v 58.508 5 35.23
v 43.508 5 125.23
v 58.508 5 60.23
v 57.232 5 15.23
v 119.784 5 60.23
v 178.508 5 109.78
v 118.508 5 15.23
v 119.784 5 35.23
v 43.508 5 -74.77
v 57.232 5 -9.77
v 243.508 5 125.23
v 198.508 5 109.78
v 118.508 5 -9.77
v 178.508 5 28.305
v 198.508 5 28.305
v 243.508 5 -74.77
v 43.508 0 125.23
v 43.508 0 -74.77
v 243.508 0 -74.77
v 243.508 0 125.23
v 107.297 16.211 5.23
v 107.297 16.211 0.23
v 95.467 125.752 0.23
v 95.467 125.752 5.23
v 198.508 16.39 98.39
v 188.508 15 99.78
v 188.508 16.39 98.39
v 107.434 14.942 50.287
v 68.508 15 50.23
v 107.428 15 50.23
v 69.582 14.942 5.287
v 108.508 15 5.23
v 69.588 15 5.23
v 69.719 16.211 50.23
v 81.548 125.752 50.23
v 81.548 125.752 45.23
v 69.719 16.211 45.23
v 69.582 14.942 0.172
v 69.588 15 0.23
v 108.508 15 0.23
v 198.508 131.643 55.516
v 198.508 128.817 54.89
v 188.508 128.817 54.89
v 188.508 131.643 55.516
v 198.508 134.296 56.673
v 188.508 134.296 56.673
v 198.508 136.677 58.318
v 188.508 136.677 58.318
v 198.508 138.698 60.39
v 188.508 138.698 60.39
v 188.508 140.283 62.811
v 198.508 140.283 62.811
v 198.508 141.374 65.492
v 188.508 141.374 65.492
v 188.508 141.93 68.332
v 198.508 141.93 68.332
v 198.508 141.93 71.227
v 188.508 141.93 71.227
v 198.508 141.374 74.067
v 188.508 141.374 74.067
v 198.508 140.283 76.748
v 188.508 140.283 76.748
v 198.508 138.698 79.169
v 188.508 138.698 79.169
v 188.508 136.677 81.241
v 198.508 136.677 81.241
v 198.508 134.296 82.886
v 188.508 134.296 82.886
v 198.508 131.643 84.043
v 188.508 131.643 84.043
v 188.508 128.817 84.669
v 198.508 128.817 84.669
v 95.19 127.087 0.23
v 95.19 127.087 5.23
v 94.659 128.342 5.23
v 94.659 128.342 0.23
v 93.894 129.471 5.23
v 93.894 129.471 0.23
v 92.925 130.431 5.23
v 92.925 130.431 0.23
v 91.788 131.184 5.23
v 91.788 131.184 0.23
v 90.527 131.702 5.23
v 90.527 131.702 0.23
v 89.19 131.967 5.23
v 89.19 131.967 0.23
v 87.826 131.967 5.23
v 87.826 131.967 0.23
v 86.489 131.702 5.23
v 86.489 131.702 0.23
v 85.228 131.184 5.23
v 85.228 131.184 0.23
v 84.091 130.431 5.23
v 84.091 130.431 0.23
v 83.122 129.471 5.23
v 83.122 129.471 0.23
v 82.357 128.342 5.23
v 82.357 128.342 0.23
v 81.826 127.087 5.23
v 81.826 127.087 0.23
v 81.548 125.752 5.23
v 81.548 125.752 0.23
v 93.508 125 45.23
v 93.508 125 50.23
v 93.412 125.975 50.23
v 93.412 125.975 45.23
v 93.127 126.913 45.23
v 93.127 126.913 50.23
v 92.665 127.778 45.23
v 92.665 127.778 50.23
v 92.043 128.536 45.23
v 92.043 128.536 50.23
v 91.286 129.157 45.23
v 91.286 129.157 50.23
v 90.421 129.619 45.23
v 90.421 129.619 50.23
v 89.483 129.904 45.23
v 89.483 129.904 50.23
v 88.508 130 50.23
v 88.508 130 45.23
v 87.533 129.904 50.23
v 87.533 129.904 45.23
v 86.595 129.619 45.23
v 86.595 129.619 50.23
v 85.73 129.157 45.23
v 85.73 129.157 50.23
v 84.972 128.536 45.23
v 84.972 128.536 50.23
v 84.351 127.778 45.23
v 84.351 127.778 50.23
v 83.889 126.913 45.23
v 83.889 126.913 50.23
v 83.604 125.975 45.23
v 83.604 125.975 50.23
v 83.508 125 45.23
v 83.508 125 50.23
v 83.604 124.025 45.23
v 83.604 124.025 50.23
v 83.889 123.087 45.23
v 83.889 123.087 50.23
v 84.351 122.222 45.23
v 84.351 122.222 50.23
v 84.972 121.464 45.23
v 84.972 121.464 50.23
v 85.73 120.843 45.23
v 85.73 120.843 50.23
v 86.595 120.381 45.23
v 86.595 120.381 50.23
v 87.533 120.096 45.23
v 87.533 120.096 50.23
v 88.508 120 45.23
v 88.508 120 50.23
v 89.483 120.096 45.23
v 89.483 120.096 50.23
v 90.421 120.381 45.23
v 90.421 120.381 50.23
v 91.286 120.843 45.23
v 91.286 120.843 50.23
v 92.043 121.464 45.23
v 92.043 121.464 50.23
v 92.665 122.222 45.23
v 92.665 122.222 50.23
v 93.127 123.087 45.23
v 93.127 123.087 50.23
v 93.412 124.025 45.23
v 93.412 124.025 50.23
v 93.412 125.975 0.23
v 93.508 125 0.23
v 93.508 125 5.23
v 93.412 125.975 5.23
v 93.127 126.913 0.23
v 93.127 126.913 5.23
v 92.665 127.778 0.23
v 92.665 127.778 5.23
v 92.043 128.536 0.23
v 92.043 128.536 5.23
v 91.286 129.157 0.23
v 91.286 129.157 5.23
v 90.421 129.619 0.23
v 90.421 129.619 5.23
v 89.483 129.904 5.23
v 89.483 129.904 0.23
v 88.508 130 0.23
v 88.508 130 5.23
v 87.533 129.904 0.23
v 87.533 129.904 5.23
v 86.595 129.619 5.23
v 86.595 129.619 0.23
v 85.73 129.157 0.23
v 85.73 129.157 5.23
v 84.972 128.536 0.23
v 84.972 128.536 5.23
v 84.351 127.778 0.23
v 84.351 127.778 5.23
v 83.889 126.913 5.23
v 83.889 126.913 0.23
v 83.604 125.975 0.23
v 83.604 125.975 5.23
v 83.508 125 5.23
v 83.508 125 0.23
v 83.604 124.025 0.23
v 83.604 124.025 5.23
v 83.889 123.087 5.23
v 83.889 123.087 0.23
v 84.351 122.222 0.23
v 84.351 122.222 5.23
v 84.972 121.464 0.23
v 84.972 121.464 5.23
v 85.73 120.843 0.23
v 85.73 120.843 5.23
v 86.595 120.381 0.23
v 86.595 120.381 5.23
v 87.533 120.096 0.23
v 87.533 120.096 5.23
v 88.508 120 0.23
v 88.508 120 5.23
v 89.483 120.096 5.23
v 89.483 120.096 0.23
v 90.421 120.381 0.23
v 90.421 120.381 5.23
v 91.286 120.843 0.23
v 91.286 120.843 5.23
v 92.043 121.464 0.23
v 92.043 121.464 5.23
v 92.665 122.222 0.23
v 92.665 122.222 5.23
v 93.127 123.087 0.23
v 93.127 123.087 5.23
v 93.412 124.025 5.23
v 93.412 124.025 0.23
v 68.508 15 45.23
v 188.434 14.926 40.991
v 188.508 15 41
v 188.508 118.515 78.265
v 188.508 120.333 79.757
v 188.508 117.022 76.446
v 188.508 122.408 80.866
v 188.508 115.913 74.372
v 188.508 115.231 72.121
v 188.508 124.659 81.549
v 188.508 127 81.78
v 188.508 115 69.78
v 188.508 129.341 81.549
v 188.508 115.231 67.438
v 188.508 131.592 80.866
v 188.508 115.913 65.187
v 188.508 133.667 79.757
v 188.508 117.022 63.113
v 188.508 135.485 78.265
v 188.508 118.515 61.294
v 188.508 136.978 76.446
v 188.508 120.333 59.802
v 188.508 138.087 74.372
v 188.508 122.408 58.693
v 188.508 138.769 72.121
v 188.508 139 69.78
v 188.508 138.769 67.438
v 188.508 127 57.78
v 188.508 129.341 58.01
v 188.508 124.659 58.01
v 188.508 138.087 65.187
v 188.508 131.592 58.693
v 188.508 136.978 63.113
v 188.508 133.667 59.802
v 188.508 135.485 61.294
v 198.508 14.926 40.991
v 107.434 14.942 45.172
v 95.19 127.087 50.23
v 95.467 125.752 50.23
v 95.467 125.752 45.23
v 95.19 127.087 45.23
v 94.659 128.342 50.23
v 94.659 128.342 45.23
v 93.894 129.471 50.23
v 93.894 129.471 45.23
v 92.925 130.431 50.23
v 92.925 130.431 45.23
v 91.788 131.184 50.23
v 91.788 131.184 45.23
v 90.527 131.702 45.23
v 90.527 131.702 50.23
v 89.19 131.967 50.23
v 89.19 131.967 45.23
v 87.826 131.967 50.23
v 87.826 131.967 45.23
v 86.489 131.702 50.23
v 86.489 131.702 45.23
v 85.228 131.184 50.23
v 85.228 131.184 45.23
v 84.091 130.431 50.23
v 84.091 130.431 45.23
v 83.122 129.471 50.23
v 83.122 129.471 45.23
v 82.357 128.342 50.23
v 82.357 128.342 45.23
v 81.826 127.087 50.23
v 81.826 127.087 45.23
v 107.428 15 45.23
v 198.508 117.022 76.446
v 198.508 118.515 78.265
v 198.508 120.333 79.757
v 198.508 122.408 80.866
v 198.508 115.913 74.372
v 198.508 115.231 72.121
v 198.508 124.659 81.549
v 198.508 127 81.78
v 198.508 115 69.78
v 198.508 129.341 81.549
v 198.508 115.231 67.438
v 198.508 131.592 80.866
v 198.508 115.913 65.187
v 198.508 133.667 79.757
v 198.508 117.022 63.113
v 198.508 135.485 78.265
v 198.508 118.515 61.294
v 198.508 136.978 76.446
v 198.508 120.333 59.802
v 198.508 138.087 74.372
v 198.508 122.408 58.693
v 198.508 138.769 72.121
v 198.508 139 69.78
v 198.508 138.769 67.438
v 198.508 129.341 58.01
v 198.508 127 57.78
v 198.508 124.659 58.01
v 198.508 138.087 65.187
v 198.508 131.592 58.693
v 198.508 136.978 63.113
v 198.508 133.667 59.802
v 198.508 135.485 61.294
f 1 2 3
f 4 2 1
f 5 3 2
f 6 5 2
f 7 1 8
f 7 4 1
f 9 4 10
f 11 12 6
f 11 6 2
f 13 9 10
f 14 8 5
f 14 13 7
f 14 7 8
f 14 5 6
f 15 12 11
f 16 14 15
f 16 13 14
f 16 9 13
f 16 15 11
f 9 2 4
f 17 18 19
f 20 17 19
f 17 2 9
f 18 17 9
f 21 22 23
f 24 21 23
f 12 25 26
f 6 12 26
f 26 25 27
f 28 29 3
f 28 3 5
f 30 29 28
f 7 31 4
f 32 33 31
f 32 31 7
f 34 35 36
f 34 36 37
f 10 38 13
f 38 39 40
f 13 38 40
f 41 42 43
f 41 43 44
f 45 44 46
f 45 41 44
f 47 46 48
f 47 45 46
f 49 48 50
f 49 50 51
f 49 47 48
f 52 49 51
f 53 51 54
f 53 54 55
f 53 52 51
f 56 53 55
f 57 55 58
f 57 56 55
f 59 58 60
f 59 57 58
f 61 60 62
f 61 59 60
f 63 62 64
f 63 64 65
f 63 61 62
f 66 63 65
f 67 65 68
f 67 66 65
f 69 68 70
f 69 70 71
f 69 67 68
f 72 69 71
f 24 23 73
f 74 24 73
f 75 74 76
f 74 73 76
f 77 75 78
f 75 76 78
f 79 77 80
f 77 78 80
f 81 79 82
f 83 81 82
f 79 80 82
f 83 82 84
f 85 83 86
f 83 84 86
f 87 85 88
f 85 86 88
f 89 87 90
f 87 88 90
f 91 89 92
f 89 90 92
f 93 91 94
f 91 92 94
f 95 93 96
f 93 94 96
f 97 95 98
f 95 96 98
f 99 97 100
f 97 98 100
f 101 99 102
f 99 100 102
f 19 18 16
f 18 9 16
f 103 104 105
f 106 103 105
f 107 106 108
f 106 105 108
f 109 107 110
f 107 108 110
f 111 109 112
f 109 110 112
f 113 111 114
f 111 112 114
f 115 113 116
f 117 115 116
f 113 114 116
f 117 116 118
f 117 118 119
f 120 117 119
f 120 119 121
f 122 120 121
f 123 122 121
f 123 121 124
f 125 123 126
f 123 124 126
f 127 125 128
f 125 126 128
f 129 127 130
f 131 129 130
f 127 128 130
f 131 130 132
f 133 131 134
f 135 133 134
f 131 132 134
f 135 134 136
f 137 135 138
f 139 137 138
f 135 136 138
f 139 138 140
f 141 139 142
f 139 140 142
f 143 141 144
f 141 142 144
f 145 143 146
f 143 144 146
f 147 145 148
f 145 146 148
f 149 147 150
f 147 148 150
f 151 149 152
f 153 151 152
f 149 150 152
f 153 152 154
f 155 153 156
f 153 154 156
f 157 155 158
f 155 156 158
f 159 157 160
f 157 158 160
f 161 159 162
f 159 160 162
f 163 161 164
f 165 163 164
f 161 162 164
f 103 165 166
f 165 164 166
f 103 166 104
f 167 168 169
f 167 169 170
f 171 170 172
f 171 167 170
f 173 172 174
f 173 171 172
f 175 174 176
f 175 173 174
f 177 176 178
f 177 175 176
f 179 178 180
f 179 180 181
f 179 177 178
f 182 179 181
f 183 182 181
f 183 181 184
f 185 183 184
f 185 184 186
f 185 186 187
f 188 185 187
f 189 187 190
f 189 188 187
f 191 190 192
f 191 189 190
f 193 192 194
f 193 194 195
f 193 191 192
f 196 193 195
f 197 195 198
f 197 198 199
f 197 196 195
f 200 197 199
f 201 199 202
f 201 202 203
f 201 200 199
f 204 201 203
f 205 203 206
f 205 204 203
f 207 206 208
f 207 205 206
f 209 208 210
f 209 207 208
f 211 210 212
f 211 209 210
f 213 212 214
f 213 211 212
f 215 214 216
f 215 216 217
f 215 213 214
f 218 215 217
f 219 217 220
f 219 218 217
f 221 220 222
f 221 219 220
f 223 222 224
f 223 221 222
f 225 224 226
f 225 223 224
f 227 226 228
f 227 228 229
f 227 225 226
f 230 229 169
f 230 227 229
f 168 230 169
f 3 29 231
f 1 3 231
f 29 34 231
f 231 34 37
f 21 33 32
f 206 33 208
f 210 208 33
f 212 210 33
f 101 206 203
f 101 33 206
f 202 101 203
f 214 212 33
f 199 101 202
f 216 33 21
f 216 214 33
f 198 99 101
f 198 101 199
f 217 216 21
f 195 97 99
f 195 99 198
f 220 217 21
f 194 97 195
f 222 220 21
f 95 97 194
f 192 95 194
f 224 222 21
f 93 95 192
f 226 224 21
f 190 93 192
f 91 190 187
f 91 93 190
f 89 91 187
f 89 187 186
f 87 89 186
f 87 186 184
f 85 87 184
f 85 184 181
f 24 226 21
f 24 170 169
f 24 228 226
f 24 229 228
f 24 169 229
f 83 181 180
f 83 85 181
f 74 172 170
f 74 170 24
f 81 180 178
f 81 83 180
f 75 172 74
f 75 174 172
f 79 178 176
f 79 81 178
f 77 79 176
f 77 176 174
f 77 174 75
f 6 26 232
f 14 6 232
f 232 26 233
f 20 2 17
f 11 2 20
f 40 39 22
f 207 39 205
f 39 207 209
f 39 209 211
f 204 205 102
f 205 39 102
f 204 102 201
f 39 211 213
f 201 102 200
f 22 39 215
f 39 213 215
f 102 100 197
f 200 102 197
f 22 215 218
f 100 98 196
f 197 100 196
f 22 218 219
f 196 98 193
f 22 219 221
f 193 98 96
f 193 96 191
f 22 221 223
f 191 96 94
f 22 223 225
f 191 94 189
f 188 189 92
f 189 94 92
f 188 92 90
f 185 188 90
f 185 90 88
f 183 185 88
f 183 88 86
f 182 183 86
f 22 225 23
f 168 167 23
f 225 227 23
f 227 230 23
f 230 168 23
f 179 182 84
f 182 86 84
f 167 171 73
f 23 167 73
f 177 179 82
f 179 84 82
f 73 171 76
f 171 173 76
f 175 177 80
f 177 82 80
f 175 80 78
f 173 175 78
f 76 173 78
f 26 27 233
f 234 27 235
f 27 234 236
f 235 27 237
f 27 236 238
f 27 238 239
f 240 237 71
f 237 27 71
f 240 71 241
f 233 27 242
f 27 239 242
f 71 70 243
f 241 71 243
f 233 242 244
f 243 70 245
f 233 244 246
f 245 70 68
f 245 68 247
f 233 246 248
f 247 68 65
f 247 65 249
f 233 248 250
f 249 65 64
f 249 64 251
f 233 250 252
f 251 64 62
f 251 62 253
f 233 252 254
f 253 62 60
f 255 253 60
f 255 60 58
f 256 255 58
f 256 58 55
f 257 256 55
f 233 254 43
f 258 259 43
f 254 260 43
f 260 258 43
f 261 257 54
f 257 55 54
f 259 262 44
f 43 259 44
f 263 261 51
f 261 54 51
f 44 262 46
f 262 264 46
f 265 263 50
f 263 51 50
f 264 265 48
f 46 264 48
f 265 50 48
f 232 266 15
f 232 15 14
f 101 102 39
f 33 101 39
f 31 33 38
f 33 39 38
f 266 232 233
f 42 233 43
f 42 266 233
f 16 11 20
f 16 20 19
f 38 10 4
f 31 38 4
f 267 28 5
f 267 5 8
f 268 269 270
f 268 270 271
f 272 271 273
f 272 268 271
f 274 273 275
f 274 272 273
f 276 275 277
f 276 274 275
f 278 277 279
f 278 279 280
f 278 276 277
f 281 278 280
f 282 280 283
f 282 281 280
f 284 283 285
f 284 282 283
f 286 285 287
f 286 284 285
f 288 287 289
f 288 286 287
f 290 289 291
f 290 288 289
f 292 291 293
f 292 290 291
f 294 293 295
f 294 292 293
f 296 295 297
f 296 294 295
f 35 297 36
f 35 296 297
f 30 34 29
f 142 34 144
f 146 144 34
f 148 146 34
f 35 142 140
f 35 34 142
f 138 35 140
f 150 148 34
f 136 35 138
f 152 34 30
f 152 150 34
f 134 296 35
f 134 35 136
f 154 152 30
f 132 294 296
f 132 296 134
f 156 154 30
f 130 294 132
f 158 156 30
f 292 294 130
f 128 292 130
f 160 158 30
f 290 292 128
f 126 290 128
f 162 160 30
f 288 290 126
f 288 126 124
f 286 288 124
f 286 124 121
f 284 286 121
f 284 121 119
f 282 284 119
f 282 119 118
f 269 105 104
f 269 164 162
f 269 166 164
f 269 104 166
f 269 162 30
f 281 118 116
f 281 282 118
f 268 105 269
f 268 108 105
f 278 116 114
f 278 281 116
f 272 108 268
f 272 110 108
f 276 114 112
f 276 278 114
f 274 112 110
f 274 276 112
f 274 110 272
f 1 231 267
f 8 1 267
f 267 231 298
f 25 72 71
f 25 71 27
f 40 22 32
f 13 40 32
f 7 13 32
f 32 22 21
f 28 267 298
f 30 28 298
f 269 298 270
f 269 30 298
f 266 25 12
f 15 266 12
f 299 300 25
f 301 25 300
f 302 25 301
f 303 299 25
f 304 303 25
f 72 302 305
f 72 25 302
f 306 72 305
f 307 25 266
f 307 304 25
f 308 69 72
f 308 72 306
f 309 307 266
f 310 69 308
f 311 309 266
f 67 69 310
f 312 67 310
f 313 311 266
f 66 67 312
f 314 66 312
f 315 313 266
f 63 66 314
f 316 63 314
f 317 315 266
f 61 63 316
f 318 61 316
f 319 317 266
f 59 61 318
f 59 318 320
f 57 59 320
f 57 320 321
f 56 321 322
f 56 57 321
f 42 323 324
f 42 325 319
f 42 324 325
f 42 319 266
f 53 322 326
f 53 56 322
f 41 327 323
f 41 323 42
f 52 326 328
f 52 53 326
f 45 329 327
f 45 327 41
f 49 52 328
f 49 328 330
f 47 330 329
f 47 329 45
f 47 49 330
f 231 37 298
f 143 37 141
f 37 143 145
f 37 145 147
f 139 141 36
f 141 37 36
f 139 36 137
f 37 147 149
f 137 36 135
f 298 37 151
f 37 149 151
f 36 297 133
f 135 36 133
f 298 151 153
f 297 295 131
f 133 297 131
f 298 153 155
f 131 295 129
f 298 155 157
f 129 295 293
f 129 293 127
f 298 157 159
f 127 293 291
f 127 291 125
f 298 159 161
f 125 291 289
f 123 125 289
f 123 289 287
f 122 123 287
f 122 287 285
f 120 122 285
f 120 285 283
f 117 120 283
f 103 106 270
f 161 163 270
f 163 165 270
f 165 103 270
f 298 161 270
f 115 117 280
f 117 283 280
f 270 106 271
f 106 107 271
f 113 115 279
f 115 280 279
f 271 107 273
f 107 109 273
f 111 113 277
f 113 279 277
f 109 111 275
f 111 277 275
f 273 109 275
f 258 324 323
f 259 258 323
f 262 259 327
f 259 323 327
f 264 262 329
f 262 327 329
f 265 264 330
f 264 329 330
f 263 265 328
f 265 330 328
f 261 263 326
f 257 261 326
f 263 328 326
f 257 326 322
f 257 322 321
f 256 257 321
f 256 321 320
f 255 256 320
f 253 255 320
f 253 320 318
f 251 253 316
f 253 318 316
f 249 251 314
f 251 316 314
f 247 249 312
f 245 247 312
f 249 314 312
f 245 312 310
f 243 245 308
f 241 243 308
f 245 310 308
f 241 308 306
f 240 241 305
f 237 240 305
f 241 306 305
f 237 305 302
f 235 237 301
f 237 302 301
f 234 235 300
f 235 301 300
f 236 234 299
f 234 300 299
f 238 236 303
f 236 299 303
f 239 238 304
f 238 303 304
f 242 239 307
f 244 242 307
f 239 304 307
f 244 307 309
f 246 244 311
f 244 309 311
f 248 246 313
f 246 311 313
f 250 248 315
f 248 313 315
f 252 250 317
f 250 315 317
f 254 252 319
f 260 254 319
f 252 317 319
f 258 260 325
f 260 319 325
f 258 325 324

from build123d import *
from OCP.BRepFilletAPI import BRepFilletAPI_MakeChamfer

# Parameters (mm, degrees)
SKETCH_2_W               = 240.549430728
SKETCH_2_H               = 149.540933388
EXTRUDE_1_DEPTH          = 5
SKETCH_6_W               = 93.246571425
SKETCH_6_H               = 149.540933388
EXTRUDE_4_DEPTH          = 5
SKETCH_8_W               = 274.716709757
SKETCH_8_H               = 58.51354913
EXTRUDE_6_DEPTH          = 5
CUT_EXTRUDE_2_DEPTH      = 252.755772101
CUT_EXTRUDE_2_DEPTH_BACK = 252.755772101
SKETCH_9_W               = 59.079292396
SKETCH_9_H               = 149.540933388
SKETCH_10_W              = 104.703380117
SKETCH_10_H              = 208.054482518
CUT_EXTRUDE_3_DEPTH      = 10
SKETCH_12_W              = 200
SKETCH_12_H              = 200
EXTRUDE_7_DEPTH          = 5
SKETCH_13_OUTSIDE_W      = 259.728
SKETCH_13_OUTSIDE_H      = 267.782
SKETCH_13_OUTSIDE_W_2    = 200
SKETCH_13_OUTSIDE_H_2    = 200
CUT_EXTRUDE_4_DEPTH      = 278.64321362
EXTRUDE_START            = -75
SKETCH_18_R              = 5
EXTRUDE_9_DEPTH          = 5
EXTRUDE_START_2          = -45
SKETCH_16_R              = 12
EXTRUDE_10_DEPTH         = 10
CHAMFER_1_SIZE           = 10
CHAMFER_1_SIZE2          = 11.275873044
CHAMFER_1_SIZE2_2        = 11.474527449
CHAMFER_2_SIZE           = 10


with BuildPart() as part:
    # 草图2 → 凸台-拉伸1 (new body)
    with BuildSketch(Plane(origin=(0, 0, 0), x_dir=(1, 0, 0), z_dir=(0, 1, 0))):
        Rectangle(SKETCH_2_W, SKETCH_2_H)
    extrude(amount=EXTRUDE_1_DEPTH)

    # 草图6 → 凸台-拉伸4 (add)
    with BuildSketch(Plane(origin=(0, 5, 0), x_dir=(1, 0, 0), z_dir=(0, 1, 0))):
        with Locations((166.898001077, 0)):
            Rectangle(SKETCH_6_W, SKETCH_6_H)
    extrude(amount=-EXTRUDE_4_DEPTH)

    # 草图8 → 凸台-拉伸6 (add)
    with BuildSketch(Plane(origin=(0, 5, 0), x_dir=(1, 0, 0), z_dir=(0, 1, 0))):
        with Locations((76.162931911, -104.027241259)):
            Rectangle(SKETCH_8_W, SKETCH_8_H)
    extrude(amount=-EXTRUDE_6_DEPTH)

    # 草图9 → 切除-拉伸2 (cut, two sides: drawn at the far end of the back side and taken through both)
    with BuildSketch(Plane(origin=(0, 5, 0), x_dir=(1, 0, 0), z_dir=(0, 1, 0)).offset(-CUT_EXTRUDE_2_DEPTH_BACK)):
        with Locations((-90.735069166, 0)):
            Rectangle(SKETCH_9_W, SKETCH_9_H)
    extrude(amount=CUT_EXTRUDE_2_DEPTH + CUT_EXTRUDE_2_DEPTH_BACK, mode=Mode.SUBTRACT)

    # 草图10 → 切除-拉伸3 (cut)
    with BuildSketch(Plane(origin=(0, 5, 0), x_dir=(1, 0, 0), z_dir=(0, 1, 0))):
        with Locations((-8.84373291, -29.256774565)):
            Rectangle(SKETCH_10_W, SKETCH_10_H)
    extrude(amount=-CUT_EXTRUDE_3_DEPTH, mode=Mode.SUBTRACT)

    # 草图12 → 凸台-拉伸7 (add)
    with BuildSketch(Plane(origin=(0, 5, 0), x_dir=(1, 0, 0), z_dir=(0, 1, 0))):
        with Locations((143.507957149, -25.229533306)):
            Rectangle(SKETCH_12_W, SKETCH_12_H)
    extrude(amount=-EXTRUDE_7_DEPTH)

    # 草图13 outside → 切除-拉伸4 (cut, through all)
    with BuildSketch(Plane(origin=(0, 5, 0), x_dir=(1, 0, 0), z_dir=(0, 1, 0))):
        with Locations((143.508, -29.257)):
            Rectangle(SKETCH_13_OUTSIDE_W, SKETCH_13_OUTSIDE_H)
        with Locations((143.507957149, -25.229533306)):
            Rectangle(SKETCH_13_OUTSIDE_W_2, SKETCH_13_OUTSIDE_H_2, mode=Mode.SUBTRACT)
    extrude(amount=-CUT_EXTRUDE_4_DEPTH, mode=Mode.SUBTRACT)

    # 草图18 → 凸台-拉伸9 (add)
    with BuildSketch(Plane.XY.offset(125.229533306).offset(EXTRUDE_START)):
        with BuildLine():
            Line((108.507957149, 5), (95.467491183, 125.751589006))
            ThreePointArc((95.467491183, 125.751589006), (88.507957149, 132), (81.548423116, 125.751589006))
            Line((81.548423116, 125.751589006), (68.507957149, 5))
            Line((68.507957149, 5), (108.507957149, 5))
        make_face()
        with Locations((88.507957149, 125)):
            Circle(SKETCH_18_R, mode=Mode.SUBTRACT)
    extrude_9 = extrude(amount=-EXTRUDE_9_DEPTH)

    # 镜向1: 凸台-拉伸9 across plane
    add(extrude_9.mirror(Plane.XY.offset(25.229533306)))

    # 草图16 → 凸台-拉伸10 (add)
    with BuildSketch(Plane(origin=(243.507957149, 0, 0), x_dir=(0, 0, -1), z_dir=(1, 0, 0)).offset(EXTRUDE_START_2)):
        with BuildLine():
            Line((-39.779533306, 5), (-54.890001581, 128.817097965))
            ThreePointArc((-54.890001581, 128.817097965), (-69.779533306, 142), (-84.669065031, 128.817097965))
            Line((-84.669065031, 128.817097965), (-99.779533306, 5))
            Line((-99.779533306, 5), (-39.779533306, 5))
        make_face()
        with Locations((-69.779533306, 127)):
            Circle(SKETCH_16_R, mode=Mode.SUBTRACT)
    extrude(amount=-EXTRUDE_10_DEPTH)

    # 倒角1: one chamfer whose edges measure the first distance from different faces: ONE call of the kernel's chamfer builder (chamfer() names one face for all edges)
    chamfer_1_edges_1 = [part.edges().sort_by_distance(p)[0] for p in [
        (88.507957149, 5, 50.229533306),
        (88.507957149, 5, 45.229533306),
        (88.507957149, 5, 5.229533306),
        (88.507957149, 5, 0.229533306),
    ]]
    chamfer_1_edges_2 = [part.edges().sort_by_distance(p)[0] for p in [
        (108.507957149, 5, 47.729533306),
    ]]
    chamfer_1_side_2 = [part.faces().sort_by_distance(p)[0] for p in [
        (101.987724166, 65.375794503, 47.729533306),
    ]]
    chamfer_1_edges_3 = [part.edges().sort_by_distance(p)[0] for p in [
        (68.507957149, 5, 47.729533306),
        (108.507957149, 5, 2.729533306),
    ]]
    chamfer_1_side_3 = [part.faces().sort_by_distance(p)[0] for p in [
        (143.302828944, 5, 24.544148691),
    ]]
    chamfer_1_edges_4 = [part.edges().sort_by_distance(p)[0] for p in [
        (68.507957149, 5, 2.729533306),
    ]]
    chamfer_1_side_4 = [part.faces().sort_by_distance(p)[0] for p in [
        (75.028190132, 65.375794503, 2.729533306),
    ]]
    chamfer_1_edges_5 = [part.edges().sort_by_distance(p)[0] for p in [
        (193.507957149, 5, 39.779533306),
    ]]
    chamfer_1_side_5 = [part.faces().sort_by_distance(p)[0] for p in [
        (193.507957149, 66.908548983, 47.334767443),
    ]]
    chamfer_1_edges_6 = [part.edges().sort_by_distance(p)[0] for p in [
        (193.507957149, 5, 99.779533306),
    ]]
    chamfer_1_side_6 = [part.faces().sort_by_distance(p)[0] for p in [
        (143.302828944, 5, 24.544148691),
    ]]
    chamfer_1 = BRepFilletAPI_MakeChamfer(part.part.solid().wrapped)
    for e in chamfer_1_edges_1:
        chamfer_1.Add(CHAMFER_1_SIZE, e.wrapped)
    for e in chamfer_1_edges_2:
        chamfer_1.Add(CHAMFER_1_SIZE, CHAMFER_1_SIZE2, e.wrapped, chamfer_1_side_2[0].wrapped)  # the first distance lies on this face
    for e in chamfer_1_edges_3:
        chamfer_1.Add(CHAMFER_1_SIZE, CHAMFER_1_SIZE2, e.wrapped, chamfer_1_side_3[0].wrapped)  # the first distance lies on this face
    for e in chamfer_1_edges_4:
        chamfer_1.Add(CHAMFER_1_SIZE, CHAMFER_1_SIZE2, e.wrapped, chamfer_1_side_4[0].wrapped)  # the first distance lies on this face
    for e in chamfer_1_edges_5:
        chamfer_1.Add(CHAMFER_1_SIZE, CHAMFER_1_SIZE2_2, e.wrapped, chamfer_1_side_5[0].wrapped)  # the first distance lies on this face
    for e in chamfer_1_edges_6:
        chamfer_1.Add(CHAMFER_1_SIZE, CHAMFER_1_SIZE2_2, e.wrapped, chamfer_1_side_6[0].wrapped)  # the first distance lies on this face
    add(Compound.cast(chamfer_1.Shape()), mode=Mode.REPLACE)

    # 倒角2
    chamfer_2_edges = [part.edges().sort_by_distance(p)[0] for p in [
        (188.507957149, 5, 69.042269581),
    ]]
    chamfer(chamfer_2_edges, length=CHAMFER_2_SIZE)


solid = part.part
